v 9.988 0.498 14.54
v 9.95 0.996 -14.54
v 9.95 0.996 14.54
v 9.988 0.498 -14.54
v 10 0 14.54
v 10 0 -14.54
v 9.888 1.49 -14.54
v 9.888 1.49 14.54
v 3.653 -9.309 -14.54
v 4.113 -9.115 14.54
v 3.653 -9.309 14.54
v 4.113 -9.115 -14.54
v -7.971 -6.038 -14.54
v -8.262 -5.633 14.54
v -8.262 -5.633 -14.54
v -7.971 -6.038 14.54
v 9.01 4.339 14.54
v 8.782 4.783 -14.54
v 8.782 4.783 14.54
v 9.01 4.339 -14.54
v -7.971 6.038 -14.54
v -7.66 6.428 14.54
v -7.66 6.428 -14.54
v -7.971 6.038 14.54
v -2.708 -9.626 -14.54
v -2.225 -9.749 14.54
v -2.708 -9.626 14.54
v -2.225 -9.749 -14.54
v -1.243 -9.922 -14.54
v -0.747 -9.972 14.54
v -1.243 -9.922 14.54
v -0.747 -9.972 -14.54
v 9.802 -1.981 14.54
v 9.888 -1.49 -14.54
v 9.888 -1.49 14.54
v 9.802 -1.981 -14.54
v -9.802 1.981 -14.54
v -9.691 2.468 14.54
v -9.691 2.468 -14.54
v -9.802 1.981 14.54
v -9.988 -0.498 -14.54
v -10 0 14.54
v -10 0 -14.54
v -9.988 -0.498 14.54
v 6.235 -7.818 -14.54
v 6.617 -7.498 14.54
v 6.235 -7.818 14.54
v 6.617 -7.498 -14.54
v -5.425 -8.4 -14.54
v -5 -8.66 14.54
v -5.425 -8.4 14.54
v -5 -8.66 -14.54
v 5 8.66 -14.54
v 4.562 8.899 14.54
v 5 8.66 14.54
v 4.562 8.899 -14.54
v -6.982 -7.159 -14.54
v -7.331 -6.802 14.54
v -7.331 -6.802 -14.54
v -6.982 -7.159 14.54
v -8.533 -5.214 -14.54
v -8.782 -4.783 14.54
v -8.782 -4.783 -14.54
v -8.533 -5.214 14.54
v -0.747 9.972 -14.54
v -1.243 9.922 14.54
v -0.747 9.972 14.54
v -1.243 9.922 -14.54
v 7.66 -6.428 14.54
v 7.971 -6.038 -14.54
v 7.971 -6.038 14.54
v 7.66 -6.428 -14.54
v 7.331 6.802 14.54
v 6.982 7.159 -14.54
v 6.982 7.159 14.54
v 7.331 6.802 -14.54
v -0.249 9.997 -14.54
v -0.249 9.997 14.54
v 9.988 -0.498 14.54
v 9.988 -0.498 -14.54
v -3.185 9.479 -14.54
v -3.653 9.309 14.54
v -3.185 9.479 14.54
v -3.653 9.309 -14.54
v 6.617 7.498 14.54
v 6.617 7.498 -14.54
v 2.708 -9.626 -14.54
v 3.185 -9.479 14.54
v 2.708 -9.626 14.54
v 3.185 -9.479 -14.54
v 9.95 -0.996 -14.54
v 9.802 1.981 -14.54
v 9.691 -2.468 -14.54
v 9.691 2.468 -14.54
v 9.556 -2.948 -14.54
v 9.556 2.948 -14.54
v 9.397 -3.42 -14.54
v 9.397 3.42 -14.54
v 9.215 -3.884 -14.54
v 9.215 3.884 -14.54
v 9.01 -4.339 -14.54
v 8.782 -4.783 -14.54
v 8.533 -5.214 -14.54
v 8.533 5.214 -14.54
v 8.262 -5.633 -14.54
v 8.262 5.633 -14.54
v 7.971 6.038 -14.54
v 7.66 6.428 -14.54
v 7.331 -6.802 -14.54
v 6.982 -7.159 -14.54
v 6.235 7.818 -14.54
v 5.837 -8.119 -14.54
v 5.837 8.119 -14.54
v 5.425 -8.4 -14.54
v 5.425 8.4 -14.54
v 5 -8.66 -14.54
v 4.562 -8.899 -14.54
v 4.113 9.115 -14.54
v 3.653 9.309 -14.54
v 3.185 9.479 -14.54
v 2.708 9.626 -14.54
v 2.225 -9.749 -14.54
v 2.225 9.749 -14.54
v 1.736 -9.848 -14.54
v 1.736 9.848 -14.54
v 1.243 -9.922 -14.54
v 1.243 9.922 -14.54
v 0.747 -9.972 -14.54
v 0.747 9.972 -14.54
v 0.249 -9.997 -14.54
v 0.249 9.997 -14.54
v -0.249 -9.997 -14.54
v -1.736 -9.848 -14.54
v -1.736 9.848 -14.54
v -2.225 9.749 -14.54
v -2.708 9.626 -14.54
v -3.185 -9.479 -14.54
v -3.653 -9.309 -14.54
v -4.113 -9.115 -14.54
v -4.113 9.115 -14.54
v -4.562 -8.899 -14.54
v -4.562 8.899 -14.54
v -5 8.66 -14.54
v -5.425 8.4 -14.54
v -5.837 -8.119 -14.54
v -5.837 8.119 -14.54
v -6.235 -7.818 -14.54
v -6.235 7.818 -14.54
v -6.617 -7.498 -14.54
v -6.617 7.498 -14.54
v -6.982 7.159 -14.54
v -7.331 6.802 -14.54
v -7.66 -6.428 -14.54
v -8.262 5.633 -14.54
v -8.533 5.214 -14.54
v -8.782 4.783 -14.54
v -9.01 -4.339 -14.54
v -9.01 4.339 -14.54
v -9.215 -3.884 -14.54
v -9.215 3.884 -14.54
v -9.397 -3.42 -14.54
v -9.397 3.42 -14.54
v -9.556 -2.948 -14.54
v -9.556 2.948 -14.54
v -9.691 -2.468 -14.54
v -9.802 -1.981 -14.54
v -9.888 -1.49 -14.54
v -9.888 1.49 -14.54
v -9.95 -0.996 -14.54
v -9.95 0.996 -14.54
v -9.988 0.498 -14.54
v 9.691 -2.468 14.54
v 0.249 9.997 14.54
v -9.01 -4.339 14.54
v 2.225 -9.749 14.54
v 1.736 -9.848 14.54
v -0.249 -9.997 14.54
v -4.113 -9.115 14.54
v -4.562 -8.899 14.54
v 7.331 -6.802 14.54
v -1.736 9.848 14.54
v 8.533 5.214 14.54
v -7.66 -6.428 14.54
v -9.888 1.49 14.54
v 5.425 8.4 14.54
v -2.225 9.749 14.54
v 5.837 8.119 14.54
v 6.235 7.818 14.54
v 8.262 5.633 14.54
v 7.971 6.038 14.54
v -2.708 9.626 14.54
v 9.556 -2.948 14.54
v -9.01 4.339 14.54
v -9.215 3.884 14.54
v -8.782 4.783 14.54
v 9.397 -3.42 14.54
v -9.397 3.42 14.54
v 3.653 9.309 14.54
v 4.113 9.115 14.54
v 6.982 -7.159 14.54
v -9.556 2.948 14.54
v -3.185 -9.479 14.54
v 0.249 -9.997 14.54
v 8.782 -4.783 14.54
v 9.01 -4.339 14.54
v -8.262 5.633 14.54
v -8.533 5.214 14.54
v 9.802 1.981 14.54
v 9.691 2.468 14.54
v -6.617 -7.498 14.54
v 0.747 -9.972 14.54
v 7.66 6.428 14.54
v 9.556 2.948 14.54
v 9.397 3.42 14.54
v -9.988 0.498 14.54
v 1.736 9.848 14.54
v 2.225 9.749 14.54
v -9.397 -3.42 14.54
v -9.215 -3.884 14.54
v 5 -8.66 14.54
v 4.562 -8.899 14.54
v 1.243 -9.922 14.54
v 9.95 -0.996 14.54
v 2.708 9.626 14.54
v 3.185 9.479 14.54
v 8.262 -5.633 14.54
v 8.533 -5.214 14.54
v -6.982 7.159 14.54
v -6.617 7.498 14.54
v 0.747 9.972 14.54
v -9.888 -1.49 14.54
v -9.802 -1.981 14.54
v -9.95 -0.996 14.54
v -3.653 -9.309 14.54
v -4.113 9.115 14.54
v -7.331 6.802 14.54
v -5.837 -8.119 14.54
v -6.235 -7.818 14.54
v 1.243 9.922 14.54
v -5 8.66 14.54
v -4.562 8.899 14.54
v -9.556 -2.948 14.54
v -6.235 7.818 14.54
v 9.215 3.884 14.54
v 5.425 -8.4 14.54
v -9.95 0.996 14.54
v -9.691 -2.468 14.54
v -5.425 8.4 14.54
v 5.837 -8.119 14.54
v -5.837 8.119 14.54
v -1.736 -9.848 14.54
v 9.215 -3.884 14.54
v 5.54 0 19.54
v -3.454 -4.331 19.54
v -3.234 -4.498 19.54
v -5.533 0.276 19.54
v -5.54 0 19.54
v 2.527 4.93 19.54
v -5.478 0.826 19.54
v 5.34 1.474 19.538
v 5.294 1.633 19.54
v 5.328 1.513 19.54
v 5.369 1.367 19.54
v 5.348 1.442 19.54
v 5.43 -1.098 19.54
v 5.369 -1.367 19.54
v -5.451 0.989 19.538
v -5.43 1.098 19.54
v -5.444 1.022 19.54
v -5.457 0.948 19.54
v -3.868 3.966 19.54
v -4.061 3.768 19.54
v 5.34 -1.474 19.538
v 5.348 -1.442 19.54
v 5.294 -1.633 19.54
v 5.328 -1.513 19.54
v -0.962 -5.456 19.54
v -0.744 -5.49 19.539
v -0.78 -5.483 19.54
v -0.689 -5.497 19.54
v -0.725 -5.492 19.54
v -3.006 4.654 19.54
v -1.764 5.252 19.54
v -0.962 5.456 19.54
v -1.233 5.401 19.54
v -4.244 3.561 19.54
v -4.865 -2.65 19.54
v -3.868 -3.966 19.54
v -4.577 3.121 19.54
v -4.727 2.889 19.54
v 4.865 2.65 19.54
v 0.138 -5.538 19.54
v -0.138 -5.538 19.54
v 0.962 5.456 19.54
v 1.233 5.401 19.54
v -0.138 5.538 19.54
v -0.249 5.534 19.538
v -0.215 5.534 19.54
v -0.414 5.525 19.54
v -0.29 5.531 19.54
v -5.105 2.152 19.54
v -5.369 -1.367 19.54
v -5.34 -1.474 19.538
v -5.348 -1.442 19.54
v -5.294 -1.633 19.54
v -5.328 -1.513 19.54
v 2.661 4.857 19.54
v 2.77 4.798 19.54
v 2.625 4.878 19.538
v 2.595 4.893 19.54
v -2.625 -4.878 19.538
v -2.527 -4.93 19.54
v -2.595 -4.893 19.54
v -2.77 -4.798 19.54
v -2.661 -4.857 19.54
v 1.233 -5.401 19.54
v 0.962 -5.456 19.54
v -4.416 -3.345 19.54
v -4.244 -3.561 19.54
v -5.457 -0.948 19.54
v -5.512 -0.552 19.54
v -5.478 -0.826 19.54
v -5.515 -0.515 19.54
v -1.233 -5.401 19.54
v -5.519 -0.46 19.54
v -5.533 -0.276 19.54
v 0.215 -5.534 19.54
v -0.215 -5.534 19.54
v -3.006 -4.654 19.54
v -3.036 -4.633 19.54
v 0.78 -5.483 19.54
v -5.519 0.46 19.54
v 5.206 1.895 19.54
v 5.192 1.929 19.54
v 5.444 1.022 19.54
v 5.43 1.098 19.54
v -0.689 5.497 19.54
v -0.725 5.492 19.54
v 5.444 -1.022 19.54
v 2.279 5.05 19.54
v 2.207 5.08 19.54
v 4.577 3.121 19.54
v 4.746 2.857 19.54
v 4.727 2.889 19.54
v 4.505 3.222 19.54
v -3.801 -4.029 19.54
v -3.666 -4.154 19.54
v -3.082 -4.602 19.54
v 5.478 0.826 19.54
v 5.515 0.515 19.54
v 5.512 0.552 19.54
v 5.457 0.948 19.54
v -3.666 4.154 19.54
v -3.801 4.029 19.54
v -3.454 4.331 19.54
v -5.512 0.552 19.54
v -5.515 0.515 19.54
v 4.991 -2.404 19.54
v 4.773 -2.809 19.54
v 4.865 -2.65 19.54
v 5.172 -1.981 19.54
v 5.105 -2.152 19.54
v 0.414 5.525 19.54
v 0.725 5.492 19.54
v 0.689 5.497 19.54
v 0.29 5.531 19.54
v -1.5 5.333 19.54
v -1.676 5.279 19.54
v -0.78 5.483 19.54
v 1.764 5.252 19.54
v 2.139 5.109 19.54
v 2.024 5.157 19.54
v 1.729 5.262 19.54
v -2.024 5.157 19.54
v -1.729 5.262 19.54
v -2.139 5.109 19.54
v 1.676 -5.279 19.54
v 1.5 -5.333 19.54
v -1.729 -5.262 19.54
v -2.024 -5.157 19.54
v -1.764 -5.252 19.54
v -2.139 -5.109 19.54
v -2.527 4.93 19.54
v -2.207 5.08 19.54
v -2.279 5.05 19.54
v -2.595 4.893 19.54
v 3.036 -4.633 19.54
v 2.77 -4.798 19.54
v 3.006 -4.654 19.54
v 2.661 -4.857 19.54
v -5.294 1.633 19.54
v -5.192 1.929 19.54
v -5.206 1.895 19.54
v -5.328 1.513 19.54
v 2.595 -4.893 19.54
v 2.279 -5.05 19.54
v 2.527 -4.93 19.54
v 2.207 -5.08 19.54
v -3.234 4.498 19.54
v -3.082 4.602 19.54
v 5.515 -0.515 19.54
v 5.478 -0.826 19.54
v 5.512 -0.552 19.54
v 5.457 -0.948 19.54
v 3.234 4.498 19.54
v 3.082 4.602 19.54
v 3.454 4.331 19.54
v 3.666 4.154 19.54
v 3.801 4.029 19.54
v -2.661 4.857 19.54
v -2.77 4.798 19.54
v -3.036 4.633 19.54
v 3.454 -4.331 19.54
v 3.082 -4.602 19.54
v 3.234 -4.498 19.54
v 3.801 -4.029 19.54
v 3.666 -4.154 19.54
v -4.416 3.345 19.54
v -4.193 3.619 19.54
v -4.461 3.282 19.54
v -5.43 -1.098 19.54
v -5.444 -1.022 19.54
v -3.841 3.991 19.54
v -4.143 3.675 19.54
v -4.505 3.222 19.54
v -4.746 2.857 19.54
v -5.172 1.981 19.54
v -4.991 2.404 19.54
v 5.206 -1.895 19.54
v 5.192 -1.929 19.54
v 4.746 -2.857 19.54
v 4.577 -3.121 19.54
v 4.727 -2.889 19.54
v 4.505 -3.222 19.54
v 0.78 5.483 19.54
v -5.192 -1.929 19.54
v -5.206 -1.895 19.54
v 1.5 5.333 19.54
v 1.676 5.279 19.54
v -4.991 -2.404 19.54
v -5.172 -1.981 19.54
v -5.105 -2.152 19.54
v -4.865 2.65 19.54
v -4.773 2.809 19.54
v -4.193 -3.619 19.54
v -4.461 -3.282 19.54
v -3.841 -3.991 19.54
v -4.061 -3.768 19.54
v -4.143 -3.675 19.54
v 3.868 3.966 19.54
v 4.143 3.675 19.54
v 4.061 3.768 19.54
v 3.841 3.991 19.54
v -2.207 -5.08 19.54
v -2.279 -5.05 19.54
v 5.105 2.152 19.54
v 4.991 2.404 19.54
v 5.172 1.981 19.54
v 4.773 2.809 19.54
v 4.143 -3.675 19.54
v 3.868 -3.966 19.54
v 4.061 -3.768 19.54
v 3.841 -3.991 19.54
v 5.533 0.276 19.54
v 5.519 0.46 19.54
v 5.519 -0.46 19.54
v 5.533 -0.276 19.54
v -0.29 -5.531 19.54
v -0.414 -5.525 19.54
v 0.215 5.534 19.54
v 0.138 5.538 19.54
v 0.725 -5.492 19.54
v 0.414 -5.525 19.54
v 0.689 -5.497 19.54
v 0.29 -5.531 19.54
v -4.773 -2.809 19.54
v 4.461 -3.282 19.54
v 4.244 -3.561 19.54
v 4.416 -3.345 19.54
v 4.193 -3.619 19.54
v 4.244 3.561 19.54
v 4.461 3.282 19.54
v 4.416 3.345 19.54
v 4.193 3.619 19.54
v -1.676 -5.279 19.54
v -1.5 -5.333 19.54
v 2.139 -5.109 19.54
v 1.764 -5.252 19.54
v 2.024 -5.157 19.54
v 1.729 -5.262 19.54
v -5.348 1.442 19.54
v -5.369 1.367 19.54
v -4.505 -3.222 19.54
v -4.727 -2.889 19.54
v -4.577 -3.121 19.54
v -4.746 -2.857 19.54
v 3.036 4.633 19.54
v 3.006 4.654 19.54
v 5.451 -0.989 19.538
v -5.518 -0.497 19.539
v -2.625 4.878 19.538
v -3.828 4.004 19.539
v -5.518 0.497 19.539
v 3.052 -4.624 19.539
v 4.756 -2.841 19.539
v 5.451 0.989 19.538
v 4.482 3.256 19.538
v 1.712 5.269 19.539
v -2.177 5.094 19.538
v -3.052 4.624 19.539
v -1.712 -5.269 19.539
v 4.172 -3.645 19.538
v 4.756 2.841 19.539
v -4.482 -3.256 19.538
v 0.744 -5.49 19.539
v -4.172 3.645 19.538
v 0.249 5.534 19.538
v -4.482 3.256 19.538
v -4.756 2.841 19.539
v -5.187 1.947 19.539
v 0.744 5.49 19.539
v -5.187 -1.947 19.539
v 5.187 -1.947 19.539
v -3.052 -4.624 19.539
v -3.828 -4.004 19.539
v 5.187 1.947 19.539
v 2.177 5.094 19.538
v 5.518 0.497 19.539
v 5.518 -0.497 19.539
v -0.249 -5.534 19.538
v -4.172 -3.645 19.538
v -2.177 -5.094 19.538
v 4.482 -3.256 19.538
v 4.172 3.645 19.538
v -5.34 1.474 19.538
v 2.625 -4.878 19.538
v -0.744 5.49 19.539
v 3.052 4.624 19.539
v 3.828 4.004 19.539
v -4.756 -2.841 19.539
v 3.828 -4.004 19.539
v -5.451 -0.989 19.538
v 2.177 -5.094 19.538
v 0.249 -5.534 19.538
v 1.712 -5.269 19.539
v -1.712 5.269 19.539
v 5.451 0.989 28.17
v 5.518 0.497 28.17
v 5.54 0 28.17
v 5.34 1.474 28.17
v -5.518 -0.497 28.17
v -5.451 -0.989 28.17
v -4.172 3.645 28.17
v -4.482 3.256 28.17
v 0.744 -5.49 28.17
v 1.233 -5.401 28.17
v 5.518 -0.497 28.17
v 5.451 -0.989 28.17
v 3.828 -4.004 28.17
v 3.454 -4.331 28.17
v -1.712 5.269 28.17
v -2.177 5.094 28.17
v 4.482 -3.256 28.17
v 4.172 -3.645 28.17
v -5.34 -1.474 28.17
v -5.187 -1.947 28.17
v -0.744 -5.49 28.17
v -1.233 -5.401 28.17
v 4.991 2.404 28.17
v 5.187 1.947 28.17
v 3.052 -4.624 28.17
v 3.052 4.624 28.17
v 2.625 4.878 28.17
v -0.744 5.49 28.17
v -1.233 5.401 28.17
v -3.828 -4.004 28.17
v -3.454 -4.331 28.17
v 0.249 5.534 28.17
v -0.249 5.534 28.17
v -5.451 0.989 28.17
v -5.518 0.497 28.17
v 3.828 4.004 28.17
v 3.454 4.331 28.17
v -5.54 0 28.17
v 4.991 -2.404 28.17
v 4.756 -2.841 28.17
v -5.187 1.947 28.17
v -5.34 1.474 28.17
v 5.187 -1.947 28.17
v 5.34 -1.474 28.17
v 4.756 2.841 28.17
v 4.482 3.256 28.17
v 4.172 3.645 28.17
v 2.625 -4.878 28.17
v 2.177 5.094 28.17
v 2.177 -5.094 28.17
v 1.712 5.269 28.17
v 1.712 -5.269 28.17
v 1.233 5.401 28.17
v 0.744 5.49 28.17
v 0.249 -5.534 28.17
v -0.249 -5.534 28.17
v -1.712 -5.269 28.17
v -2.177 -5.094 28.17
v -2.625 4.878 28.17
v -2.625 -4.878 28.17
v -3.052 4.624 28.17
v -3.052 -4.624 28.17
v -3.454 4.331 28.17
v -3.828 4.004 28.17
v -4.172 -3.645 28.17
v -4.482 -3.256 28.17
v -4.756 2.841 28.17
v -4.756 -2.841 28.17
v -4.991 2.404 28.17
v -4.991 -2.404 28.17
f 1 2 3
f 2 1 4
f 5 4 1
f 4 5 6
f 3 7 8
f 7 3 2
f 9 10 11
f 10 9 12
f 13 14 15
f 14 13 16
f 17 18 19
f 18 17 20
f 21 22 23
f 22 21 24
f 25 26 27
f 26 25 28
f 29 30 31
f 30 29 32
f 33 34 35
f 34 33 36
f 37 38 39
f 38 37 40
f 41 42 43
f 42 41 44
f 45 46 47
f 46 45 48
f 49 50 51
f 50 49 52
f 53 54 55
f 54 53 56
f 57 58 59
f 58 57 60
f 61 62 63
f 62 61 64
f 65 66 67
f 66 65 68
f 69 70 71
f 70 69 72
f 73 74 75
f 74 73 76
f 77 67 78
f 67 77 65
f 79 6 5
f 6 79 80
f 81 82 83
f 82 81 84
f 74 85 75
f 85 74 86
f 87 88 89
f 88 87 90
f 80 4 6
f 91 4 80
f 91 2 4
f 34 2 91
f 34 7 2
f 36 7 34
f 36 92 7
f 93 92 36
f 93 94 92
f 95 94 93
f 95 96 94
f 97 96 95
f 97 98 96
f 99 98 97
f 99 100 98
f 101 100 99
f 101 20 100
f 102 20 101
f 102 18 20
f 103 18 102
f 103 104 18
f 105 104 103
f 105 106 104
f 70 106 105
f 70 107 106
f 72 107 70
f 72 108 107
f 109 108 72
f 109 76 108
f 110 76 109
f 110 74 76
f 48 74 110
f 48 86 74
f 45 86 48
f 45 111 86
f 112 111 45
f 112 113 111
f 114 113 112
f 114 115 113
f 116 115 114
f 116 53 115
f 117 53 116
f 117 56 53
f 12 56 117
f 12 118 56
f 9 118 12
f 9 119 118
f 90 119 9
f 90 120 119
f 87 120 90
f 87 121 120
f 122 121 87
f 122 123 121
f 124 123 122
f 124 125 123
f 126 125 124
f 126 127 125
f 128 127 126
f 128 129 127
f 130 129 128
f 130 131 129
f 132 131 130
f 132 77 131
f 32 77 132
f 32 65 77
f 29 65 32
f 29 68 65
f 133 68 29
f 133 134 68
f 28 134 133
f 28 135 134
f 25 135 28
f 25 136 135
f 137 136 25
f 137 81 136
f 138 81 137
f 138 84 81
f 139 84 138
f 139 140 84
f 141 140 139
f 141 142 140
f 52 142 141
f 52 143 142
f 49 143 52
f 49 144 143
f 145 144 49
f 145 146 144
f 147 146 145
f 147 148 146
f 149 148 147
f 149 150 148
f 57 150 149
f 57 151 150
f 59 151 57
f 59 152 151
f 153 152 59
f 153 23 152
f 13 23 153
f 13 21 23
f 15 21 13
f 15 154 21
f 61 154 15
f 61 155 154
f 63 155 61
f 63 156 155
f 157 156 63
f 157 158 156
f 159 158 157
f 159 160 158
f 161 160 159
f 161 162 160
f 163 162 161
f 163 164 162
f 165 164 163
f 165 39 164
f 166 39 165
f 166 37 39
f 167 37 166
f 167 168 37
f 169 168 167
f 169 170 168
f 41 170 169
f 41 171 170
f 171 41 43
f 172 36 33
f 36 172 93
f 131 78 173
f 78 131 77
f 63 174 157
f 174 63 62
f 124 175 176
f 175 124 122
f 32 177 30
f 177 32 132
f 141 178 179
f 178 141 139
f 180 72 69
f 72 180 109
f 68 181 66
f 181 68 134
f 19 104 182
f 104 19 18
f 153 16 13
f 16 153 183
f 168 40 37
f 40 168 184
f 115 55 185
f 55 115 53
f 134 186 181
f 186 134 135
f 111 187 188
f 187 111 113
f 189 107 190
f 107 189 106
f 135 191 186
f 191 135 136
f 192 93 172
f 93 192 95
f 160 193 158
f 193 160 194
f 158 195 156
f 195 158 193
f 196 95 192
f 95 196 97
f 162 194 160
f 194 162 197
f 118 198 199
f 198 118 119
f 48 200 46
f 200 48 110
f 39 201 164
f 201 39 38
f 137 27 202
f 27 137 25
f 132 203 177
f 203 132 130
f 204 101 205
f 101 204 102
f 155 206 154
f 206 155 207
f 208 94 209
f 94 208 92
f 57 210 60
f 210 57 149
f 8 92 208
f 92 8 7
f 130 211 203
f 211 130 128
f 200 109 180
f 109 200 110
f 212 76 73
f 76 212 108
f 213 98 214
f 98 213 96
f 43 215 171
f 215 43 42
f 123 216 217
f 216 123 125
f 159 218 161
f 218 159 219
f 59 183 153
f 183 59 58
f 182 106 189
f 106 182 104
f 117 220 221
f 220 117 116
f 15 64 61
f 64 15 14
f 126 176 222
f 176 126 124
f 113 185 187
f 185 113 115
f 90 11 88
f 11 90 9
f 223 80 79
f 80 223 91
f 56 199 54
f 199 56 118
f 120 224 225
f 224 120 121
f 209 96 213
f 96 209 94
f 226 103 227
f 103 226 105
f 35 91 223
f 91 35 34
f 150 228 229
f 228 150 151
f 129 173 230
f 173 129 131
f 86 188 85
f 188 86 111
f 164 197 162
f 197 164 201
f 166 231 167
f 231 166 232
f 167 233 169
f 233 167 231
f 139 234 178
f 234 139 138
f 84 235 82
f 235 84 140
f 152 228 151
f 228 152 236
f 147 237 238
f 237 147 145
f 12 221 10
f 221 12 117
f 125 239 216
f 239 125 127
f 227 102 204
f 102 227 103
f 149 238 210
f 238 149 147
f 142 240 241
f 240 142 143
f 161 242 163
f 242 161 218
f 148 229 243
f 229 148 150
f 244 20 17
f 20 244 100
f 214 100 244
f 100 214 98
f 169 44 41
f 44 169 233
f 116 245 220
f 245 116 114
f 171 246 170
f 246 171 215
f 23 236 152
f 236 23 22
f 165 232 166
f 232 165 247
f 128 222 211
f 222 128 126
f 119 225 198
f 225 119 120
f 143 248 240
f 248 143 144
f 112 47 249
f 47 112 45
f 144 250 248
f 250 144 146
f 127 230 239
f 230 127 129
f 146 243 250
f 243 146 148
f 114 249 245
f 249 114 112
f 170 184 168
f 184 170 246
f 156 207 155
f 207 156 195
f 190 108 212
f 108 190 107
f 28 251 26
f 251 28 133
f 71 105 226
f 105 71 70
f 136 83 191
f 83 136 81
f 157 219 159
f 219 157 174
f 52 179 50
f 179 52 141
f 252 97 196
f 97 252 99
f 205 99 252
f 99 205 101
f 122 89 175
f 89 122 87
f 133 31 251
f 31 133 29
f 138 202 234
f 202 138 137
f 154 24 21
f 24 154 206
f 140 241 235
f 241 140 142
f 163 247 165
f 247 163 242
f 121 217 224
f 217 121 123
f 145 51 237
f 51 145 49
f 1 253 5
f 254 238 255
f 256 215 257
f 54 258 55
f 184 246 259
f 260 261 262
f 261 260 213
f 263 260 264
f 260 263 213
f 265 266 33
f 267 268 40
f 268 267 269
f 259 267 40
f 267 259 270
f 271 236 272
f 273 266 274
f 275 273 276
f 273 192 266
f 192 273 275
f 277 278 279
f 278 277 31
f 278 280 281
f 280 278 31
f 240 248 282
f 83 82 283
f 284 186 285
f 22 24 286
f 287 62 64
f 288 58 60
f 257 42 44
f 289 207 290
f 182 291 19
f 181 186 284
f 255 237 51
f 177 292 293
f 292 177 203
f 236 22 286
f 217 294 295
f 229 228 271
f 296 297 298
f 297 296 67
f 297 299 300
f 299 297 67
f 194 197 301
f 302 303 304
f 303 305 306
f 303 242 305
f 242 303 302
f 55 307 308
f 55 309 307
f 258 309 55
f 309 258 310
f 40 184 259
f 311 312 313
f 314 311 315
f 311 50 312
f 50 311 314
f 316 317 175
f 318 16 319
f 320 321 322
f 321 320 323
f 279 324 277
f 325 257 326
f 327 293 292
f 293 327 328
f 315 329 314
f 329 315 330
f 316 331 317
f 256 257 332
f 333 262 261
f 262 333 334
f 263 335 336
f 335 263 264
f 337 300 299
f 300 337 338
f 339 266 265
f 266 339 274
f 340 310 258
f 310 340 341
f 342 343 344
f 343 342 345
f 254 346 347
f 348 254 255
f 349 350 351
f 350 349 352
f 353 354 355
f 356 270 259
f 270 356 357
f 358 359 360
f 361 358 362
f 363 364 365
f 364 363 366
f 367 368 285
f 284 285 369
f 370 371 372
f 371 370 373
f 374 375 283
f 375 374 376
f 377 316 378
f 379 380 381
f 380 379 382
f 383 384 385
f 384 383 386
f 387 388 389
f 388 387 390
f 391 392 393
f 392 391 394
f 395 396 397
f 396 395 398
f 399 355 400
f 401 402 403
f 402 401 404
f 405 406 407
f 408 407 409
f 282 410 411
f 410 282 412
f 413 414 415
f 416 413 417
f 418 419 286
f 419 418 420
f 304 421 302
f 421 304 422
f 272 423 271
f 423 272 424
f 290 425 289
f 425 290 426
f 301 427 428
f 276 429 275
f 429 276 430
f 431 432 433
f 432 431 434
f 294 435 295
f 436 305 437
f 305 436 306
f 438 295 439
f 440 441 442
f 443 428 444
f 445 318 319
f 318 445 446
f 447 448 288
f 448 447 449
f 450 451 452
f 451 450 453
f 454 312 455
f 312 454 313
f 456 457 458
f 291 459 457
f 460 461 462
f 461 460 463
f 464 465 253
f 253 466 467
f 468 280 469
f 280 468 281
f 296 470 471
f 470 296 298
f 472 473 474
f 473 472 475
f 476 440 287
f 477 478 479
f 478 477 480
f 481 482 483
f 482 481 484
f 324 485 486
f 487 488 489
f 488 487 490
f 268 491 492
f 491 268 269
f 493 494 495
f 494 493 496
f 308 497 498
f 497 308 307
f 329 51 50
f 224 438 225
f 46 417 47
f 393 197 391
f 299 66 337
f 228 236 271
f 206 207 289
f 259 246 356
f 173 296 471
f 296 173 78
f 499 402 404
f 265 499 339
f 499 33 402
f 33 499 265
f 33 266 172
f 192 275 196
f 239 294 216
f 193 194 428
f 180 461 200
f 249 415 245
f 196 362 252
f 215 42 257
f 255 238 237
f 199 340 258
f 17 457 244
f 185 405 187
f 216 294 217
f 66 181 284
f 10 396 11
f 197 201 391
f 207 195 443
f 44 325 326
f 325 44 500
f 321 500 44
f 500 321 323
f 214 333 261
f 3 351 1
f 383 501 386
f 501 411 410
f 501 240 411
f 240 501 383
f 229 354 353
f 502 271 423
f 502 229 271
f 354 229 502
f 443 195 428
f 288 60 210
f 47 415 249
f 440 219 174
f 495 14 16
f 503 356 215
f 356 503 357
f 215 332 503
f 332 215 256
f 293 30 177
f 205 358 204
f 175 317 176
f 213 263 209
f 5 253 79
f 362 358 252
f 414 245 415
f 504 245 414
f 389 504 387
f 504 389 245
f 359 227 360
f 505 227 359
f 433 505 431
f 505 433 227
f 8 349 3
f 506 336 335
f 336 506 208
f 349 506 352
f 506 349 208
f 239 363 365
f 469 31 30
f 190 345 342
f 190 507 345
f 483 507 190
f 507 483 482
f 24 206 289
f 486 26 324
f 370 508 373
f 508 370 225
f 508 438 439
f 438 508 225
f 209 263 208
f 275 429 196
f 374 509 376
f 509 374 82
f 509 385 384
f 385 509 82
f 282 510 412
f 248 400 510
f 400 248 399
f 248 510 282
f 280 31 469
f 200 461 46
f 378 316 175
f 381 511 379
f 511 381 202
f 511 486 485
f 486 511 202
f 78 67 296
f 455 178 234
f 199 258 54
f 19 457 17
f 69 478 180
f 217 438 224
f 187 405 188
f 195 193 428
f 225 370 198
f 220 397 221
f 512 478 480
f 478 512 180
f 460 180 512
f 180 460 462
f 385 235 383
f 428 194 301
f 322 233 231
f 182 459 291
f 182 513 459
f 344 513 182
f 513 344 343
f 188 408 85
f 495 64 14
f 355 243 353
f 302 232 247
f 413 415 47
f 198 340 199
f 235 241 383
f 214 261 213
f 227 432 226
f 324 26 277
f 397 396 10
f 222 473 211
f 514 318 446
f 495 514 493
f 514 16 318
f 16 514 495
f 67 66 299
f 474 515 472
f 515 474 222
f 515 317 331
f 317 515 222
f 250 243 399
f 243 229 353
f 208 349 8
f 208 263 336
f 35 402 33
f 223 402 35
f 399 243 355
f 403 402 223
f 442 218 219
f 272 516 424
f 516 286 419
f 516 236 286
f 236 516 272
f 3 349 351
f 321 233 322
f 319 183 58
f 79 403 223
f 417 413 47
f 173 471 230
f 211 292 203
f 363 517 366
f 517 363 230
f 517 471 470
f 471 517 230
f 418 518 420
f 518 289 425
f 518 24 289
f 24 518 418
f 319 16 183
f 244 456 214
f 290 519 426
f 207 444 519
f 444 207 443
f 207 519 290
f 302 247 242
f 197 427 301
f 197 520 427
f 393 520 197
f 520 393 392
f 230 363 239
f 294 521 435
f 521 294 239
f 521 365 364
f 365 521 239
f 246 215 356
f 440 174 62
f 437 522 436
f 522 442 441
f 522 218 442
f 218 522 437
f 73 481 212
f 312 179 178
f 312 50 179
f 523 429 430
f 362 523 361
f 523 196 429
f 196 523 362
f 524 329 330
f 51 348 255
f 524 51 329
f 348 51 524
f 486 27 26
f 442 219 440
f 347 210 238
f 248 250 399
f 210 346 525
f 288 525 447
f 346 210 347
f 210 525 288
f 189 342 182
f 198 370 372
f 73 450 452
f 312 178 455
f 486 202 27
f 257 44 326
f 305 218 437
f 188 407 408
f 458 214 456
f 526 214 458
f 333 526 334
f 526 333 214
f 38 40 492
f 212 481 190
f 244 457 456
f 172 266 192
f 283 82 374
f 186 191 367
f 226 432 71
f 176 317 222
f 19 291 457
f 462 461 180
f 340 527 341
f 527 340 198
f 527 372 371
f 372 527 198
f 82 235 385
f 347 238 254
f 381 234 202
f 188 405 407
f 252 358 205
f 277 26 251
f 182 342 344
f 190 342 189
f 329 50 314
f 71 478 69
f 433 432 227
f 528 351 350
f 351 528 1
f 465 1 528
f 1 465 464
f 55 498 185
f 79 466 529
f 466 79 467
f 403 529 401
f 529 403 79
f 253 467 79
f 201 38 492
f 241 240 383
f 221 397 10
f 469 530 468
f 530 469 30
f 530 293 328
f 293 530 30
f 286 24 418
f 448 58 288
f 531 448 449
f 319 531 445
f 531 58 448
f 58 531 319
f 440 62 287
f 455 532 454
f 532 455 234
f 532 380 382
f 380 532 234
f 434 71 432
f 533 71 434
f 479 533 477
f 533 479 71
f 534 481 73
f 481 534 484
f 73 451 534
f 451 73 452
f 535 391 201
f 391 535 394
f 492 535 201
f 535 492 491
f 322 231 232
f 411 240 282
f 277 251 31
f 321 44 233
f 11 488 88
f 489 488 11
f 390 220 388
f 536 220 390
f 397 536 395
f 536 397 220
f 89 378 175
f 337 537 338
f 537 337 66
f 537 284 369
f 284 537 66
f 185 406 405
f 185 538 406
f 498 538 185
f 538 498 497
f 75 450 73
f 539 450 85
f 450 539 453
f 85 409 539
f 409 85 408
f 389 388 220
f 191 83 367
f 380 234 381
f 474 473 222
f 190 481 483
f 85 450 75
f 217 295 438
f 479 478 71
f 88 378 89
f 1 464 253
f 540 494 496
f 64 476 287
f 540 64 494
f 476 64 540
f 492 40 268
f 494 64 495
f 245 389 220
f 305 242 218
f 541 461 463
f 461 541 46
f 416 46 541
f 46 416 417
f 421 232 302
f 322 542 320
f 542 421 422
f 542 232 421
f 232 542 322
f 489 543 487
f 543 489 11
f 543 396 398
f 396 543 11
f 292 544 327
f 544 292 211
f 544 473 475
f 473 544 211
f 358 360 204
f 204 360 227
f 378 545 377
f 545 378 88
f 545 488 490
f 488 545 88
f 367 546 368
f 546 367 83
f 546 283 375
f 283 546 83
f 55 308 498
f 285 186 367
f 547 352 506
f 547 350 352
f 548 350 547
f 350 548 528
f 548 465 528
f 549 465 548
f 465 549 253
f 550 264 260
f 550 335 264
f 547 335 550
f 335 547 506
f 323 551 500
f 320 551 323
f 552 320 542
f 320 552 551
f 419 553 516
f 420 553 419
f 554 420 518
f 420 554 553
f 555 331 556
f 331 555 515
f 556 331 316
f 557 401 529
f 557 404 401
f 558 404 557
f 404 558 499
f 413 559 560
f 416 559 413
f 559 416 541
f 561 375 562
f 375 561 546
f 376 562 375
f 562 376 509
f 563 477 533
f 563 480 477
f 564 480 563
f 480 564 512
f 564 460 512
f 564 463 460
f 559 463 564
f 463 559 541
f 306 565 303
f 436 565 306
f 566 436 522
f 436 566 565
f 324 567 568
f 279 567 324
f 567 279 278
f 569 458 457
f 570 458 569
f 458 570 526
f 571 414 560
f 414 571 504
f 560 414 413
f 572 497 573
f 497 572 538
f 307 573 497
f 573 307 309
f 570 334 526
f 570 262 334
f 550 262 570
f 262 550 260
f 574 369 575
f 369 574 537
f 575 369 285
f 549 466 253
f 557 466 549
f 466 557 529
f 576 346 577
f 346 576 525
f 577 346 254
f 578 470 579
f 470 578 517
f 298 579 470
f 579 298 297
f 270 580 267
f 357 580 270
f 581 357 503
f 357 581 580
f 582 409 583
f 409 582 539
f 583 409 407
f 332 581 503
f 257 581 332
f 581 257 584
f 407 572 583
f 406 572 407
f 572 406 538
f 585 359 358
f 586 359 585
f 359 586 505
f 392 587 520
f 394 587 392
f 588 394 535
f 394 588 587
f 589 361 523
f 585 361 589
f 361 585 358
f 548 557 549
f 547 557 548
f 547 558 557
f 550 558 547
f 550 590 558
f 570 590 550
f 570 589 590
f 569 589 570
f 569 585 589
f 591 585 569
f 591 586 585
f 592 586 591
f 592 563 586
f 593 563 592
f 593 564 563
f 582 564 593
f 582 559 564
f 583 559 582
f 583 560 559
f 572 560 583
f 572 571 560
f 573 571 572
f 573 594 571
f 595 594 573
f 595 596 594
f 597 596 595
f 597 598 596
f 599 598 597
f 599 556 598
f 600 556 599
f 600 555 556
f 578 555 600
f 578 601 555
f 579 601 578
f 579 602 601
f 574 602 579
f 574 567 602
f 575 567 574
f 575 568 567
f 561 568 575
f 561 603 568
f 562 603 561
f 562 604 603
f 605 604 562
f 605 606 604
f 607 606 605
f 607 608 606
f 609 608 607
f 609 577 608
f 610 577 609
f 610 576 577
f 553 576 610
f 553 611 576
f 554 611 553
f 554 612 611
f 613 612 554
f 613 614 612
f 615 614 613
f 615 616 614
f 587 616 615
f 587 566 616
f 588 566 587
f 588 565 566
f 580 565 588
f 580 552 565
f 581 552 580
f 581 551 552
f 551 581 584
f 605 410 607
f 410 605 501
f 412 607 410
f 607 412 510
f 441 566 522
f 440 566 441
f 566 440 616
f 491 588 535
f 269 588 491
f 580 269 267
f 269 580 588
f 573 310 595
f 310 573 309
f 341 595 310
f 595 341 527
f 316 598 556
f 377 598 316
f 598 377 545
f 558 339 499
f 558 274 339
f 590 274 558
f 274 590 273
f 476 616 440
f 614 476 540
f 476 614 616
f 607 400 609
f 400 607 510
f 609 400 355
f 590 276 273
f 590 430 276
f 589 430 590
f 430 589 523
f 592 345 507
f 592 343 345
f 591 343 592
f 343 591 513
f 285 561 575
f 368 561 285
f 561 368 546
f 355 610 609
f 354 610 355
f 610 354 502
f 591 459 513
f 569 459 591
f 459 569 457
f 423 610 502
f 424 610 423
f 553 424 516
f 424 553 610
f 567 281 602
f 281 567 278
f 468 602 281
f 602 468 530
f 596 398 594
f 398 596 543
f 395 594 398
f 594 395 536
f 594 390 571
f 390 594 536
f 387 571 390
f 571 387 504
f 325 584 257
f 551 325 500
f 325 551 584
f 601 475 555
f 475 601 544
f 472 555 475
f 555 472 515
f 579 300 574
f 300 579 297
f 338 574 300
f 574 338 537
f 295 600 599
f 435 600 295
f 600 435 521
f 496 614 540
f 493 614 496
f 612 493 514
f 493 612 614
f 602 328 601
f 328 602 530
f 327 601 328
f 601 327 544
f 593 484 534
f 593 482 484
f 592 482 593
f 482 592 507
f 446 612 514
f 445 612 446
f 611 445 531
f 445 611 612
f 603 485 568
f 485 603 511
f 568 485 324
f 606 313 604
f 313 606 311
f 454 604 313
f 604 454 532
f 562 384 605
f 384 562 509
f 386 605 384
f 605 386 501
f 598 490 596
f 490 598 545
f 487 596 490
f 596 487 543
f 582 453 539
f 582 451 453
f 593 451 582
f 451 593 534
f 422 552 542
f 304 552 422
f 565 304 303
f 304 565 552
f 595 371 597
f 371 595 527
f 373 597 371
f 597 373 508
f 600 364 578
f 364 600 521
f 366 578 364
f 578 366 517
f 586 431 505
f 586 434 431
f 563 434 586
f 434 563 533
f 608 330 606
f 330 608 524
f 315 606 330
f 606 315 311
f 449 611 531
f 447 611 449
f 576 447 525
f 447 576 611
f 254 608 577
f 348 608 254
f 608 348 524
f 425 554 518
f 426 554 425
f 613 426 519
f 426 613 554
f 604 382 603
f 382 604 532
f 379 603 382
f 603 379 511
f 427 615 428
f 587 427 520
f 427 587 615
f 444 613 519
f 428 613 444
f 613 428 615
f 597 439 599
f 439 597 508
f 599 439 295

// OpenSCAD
$fa=0.01;
$fs=0.5;

capDia = 20;

module body() {
	cylinder(r=19/2, h=150, center=true);
}

module capsule() {
	union() {
		cylinder(r=capDia/2, h=29.08, center=true);
	
		translate([0,0,((29.08/2)+2.5)])
		cylinder(r1=capDia/2,r2=11.08/2,h=5,center=true);
	
		translate([0,0,((29.08/2)+2.5)+11.13/2])
		cylinder(r=11.08/2, h=11.13, center=true);
	}
}

//translate([0,60,0])
//body();

capsule();
